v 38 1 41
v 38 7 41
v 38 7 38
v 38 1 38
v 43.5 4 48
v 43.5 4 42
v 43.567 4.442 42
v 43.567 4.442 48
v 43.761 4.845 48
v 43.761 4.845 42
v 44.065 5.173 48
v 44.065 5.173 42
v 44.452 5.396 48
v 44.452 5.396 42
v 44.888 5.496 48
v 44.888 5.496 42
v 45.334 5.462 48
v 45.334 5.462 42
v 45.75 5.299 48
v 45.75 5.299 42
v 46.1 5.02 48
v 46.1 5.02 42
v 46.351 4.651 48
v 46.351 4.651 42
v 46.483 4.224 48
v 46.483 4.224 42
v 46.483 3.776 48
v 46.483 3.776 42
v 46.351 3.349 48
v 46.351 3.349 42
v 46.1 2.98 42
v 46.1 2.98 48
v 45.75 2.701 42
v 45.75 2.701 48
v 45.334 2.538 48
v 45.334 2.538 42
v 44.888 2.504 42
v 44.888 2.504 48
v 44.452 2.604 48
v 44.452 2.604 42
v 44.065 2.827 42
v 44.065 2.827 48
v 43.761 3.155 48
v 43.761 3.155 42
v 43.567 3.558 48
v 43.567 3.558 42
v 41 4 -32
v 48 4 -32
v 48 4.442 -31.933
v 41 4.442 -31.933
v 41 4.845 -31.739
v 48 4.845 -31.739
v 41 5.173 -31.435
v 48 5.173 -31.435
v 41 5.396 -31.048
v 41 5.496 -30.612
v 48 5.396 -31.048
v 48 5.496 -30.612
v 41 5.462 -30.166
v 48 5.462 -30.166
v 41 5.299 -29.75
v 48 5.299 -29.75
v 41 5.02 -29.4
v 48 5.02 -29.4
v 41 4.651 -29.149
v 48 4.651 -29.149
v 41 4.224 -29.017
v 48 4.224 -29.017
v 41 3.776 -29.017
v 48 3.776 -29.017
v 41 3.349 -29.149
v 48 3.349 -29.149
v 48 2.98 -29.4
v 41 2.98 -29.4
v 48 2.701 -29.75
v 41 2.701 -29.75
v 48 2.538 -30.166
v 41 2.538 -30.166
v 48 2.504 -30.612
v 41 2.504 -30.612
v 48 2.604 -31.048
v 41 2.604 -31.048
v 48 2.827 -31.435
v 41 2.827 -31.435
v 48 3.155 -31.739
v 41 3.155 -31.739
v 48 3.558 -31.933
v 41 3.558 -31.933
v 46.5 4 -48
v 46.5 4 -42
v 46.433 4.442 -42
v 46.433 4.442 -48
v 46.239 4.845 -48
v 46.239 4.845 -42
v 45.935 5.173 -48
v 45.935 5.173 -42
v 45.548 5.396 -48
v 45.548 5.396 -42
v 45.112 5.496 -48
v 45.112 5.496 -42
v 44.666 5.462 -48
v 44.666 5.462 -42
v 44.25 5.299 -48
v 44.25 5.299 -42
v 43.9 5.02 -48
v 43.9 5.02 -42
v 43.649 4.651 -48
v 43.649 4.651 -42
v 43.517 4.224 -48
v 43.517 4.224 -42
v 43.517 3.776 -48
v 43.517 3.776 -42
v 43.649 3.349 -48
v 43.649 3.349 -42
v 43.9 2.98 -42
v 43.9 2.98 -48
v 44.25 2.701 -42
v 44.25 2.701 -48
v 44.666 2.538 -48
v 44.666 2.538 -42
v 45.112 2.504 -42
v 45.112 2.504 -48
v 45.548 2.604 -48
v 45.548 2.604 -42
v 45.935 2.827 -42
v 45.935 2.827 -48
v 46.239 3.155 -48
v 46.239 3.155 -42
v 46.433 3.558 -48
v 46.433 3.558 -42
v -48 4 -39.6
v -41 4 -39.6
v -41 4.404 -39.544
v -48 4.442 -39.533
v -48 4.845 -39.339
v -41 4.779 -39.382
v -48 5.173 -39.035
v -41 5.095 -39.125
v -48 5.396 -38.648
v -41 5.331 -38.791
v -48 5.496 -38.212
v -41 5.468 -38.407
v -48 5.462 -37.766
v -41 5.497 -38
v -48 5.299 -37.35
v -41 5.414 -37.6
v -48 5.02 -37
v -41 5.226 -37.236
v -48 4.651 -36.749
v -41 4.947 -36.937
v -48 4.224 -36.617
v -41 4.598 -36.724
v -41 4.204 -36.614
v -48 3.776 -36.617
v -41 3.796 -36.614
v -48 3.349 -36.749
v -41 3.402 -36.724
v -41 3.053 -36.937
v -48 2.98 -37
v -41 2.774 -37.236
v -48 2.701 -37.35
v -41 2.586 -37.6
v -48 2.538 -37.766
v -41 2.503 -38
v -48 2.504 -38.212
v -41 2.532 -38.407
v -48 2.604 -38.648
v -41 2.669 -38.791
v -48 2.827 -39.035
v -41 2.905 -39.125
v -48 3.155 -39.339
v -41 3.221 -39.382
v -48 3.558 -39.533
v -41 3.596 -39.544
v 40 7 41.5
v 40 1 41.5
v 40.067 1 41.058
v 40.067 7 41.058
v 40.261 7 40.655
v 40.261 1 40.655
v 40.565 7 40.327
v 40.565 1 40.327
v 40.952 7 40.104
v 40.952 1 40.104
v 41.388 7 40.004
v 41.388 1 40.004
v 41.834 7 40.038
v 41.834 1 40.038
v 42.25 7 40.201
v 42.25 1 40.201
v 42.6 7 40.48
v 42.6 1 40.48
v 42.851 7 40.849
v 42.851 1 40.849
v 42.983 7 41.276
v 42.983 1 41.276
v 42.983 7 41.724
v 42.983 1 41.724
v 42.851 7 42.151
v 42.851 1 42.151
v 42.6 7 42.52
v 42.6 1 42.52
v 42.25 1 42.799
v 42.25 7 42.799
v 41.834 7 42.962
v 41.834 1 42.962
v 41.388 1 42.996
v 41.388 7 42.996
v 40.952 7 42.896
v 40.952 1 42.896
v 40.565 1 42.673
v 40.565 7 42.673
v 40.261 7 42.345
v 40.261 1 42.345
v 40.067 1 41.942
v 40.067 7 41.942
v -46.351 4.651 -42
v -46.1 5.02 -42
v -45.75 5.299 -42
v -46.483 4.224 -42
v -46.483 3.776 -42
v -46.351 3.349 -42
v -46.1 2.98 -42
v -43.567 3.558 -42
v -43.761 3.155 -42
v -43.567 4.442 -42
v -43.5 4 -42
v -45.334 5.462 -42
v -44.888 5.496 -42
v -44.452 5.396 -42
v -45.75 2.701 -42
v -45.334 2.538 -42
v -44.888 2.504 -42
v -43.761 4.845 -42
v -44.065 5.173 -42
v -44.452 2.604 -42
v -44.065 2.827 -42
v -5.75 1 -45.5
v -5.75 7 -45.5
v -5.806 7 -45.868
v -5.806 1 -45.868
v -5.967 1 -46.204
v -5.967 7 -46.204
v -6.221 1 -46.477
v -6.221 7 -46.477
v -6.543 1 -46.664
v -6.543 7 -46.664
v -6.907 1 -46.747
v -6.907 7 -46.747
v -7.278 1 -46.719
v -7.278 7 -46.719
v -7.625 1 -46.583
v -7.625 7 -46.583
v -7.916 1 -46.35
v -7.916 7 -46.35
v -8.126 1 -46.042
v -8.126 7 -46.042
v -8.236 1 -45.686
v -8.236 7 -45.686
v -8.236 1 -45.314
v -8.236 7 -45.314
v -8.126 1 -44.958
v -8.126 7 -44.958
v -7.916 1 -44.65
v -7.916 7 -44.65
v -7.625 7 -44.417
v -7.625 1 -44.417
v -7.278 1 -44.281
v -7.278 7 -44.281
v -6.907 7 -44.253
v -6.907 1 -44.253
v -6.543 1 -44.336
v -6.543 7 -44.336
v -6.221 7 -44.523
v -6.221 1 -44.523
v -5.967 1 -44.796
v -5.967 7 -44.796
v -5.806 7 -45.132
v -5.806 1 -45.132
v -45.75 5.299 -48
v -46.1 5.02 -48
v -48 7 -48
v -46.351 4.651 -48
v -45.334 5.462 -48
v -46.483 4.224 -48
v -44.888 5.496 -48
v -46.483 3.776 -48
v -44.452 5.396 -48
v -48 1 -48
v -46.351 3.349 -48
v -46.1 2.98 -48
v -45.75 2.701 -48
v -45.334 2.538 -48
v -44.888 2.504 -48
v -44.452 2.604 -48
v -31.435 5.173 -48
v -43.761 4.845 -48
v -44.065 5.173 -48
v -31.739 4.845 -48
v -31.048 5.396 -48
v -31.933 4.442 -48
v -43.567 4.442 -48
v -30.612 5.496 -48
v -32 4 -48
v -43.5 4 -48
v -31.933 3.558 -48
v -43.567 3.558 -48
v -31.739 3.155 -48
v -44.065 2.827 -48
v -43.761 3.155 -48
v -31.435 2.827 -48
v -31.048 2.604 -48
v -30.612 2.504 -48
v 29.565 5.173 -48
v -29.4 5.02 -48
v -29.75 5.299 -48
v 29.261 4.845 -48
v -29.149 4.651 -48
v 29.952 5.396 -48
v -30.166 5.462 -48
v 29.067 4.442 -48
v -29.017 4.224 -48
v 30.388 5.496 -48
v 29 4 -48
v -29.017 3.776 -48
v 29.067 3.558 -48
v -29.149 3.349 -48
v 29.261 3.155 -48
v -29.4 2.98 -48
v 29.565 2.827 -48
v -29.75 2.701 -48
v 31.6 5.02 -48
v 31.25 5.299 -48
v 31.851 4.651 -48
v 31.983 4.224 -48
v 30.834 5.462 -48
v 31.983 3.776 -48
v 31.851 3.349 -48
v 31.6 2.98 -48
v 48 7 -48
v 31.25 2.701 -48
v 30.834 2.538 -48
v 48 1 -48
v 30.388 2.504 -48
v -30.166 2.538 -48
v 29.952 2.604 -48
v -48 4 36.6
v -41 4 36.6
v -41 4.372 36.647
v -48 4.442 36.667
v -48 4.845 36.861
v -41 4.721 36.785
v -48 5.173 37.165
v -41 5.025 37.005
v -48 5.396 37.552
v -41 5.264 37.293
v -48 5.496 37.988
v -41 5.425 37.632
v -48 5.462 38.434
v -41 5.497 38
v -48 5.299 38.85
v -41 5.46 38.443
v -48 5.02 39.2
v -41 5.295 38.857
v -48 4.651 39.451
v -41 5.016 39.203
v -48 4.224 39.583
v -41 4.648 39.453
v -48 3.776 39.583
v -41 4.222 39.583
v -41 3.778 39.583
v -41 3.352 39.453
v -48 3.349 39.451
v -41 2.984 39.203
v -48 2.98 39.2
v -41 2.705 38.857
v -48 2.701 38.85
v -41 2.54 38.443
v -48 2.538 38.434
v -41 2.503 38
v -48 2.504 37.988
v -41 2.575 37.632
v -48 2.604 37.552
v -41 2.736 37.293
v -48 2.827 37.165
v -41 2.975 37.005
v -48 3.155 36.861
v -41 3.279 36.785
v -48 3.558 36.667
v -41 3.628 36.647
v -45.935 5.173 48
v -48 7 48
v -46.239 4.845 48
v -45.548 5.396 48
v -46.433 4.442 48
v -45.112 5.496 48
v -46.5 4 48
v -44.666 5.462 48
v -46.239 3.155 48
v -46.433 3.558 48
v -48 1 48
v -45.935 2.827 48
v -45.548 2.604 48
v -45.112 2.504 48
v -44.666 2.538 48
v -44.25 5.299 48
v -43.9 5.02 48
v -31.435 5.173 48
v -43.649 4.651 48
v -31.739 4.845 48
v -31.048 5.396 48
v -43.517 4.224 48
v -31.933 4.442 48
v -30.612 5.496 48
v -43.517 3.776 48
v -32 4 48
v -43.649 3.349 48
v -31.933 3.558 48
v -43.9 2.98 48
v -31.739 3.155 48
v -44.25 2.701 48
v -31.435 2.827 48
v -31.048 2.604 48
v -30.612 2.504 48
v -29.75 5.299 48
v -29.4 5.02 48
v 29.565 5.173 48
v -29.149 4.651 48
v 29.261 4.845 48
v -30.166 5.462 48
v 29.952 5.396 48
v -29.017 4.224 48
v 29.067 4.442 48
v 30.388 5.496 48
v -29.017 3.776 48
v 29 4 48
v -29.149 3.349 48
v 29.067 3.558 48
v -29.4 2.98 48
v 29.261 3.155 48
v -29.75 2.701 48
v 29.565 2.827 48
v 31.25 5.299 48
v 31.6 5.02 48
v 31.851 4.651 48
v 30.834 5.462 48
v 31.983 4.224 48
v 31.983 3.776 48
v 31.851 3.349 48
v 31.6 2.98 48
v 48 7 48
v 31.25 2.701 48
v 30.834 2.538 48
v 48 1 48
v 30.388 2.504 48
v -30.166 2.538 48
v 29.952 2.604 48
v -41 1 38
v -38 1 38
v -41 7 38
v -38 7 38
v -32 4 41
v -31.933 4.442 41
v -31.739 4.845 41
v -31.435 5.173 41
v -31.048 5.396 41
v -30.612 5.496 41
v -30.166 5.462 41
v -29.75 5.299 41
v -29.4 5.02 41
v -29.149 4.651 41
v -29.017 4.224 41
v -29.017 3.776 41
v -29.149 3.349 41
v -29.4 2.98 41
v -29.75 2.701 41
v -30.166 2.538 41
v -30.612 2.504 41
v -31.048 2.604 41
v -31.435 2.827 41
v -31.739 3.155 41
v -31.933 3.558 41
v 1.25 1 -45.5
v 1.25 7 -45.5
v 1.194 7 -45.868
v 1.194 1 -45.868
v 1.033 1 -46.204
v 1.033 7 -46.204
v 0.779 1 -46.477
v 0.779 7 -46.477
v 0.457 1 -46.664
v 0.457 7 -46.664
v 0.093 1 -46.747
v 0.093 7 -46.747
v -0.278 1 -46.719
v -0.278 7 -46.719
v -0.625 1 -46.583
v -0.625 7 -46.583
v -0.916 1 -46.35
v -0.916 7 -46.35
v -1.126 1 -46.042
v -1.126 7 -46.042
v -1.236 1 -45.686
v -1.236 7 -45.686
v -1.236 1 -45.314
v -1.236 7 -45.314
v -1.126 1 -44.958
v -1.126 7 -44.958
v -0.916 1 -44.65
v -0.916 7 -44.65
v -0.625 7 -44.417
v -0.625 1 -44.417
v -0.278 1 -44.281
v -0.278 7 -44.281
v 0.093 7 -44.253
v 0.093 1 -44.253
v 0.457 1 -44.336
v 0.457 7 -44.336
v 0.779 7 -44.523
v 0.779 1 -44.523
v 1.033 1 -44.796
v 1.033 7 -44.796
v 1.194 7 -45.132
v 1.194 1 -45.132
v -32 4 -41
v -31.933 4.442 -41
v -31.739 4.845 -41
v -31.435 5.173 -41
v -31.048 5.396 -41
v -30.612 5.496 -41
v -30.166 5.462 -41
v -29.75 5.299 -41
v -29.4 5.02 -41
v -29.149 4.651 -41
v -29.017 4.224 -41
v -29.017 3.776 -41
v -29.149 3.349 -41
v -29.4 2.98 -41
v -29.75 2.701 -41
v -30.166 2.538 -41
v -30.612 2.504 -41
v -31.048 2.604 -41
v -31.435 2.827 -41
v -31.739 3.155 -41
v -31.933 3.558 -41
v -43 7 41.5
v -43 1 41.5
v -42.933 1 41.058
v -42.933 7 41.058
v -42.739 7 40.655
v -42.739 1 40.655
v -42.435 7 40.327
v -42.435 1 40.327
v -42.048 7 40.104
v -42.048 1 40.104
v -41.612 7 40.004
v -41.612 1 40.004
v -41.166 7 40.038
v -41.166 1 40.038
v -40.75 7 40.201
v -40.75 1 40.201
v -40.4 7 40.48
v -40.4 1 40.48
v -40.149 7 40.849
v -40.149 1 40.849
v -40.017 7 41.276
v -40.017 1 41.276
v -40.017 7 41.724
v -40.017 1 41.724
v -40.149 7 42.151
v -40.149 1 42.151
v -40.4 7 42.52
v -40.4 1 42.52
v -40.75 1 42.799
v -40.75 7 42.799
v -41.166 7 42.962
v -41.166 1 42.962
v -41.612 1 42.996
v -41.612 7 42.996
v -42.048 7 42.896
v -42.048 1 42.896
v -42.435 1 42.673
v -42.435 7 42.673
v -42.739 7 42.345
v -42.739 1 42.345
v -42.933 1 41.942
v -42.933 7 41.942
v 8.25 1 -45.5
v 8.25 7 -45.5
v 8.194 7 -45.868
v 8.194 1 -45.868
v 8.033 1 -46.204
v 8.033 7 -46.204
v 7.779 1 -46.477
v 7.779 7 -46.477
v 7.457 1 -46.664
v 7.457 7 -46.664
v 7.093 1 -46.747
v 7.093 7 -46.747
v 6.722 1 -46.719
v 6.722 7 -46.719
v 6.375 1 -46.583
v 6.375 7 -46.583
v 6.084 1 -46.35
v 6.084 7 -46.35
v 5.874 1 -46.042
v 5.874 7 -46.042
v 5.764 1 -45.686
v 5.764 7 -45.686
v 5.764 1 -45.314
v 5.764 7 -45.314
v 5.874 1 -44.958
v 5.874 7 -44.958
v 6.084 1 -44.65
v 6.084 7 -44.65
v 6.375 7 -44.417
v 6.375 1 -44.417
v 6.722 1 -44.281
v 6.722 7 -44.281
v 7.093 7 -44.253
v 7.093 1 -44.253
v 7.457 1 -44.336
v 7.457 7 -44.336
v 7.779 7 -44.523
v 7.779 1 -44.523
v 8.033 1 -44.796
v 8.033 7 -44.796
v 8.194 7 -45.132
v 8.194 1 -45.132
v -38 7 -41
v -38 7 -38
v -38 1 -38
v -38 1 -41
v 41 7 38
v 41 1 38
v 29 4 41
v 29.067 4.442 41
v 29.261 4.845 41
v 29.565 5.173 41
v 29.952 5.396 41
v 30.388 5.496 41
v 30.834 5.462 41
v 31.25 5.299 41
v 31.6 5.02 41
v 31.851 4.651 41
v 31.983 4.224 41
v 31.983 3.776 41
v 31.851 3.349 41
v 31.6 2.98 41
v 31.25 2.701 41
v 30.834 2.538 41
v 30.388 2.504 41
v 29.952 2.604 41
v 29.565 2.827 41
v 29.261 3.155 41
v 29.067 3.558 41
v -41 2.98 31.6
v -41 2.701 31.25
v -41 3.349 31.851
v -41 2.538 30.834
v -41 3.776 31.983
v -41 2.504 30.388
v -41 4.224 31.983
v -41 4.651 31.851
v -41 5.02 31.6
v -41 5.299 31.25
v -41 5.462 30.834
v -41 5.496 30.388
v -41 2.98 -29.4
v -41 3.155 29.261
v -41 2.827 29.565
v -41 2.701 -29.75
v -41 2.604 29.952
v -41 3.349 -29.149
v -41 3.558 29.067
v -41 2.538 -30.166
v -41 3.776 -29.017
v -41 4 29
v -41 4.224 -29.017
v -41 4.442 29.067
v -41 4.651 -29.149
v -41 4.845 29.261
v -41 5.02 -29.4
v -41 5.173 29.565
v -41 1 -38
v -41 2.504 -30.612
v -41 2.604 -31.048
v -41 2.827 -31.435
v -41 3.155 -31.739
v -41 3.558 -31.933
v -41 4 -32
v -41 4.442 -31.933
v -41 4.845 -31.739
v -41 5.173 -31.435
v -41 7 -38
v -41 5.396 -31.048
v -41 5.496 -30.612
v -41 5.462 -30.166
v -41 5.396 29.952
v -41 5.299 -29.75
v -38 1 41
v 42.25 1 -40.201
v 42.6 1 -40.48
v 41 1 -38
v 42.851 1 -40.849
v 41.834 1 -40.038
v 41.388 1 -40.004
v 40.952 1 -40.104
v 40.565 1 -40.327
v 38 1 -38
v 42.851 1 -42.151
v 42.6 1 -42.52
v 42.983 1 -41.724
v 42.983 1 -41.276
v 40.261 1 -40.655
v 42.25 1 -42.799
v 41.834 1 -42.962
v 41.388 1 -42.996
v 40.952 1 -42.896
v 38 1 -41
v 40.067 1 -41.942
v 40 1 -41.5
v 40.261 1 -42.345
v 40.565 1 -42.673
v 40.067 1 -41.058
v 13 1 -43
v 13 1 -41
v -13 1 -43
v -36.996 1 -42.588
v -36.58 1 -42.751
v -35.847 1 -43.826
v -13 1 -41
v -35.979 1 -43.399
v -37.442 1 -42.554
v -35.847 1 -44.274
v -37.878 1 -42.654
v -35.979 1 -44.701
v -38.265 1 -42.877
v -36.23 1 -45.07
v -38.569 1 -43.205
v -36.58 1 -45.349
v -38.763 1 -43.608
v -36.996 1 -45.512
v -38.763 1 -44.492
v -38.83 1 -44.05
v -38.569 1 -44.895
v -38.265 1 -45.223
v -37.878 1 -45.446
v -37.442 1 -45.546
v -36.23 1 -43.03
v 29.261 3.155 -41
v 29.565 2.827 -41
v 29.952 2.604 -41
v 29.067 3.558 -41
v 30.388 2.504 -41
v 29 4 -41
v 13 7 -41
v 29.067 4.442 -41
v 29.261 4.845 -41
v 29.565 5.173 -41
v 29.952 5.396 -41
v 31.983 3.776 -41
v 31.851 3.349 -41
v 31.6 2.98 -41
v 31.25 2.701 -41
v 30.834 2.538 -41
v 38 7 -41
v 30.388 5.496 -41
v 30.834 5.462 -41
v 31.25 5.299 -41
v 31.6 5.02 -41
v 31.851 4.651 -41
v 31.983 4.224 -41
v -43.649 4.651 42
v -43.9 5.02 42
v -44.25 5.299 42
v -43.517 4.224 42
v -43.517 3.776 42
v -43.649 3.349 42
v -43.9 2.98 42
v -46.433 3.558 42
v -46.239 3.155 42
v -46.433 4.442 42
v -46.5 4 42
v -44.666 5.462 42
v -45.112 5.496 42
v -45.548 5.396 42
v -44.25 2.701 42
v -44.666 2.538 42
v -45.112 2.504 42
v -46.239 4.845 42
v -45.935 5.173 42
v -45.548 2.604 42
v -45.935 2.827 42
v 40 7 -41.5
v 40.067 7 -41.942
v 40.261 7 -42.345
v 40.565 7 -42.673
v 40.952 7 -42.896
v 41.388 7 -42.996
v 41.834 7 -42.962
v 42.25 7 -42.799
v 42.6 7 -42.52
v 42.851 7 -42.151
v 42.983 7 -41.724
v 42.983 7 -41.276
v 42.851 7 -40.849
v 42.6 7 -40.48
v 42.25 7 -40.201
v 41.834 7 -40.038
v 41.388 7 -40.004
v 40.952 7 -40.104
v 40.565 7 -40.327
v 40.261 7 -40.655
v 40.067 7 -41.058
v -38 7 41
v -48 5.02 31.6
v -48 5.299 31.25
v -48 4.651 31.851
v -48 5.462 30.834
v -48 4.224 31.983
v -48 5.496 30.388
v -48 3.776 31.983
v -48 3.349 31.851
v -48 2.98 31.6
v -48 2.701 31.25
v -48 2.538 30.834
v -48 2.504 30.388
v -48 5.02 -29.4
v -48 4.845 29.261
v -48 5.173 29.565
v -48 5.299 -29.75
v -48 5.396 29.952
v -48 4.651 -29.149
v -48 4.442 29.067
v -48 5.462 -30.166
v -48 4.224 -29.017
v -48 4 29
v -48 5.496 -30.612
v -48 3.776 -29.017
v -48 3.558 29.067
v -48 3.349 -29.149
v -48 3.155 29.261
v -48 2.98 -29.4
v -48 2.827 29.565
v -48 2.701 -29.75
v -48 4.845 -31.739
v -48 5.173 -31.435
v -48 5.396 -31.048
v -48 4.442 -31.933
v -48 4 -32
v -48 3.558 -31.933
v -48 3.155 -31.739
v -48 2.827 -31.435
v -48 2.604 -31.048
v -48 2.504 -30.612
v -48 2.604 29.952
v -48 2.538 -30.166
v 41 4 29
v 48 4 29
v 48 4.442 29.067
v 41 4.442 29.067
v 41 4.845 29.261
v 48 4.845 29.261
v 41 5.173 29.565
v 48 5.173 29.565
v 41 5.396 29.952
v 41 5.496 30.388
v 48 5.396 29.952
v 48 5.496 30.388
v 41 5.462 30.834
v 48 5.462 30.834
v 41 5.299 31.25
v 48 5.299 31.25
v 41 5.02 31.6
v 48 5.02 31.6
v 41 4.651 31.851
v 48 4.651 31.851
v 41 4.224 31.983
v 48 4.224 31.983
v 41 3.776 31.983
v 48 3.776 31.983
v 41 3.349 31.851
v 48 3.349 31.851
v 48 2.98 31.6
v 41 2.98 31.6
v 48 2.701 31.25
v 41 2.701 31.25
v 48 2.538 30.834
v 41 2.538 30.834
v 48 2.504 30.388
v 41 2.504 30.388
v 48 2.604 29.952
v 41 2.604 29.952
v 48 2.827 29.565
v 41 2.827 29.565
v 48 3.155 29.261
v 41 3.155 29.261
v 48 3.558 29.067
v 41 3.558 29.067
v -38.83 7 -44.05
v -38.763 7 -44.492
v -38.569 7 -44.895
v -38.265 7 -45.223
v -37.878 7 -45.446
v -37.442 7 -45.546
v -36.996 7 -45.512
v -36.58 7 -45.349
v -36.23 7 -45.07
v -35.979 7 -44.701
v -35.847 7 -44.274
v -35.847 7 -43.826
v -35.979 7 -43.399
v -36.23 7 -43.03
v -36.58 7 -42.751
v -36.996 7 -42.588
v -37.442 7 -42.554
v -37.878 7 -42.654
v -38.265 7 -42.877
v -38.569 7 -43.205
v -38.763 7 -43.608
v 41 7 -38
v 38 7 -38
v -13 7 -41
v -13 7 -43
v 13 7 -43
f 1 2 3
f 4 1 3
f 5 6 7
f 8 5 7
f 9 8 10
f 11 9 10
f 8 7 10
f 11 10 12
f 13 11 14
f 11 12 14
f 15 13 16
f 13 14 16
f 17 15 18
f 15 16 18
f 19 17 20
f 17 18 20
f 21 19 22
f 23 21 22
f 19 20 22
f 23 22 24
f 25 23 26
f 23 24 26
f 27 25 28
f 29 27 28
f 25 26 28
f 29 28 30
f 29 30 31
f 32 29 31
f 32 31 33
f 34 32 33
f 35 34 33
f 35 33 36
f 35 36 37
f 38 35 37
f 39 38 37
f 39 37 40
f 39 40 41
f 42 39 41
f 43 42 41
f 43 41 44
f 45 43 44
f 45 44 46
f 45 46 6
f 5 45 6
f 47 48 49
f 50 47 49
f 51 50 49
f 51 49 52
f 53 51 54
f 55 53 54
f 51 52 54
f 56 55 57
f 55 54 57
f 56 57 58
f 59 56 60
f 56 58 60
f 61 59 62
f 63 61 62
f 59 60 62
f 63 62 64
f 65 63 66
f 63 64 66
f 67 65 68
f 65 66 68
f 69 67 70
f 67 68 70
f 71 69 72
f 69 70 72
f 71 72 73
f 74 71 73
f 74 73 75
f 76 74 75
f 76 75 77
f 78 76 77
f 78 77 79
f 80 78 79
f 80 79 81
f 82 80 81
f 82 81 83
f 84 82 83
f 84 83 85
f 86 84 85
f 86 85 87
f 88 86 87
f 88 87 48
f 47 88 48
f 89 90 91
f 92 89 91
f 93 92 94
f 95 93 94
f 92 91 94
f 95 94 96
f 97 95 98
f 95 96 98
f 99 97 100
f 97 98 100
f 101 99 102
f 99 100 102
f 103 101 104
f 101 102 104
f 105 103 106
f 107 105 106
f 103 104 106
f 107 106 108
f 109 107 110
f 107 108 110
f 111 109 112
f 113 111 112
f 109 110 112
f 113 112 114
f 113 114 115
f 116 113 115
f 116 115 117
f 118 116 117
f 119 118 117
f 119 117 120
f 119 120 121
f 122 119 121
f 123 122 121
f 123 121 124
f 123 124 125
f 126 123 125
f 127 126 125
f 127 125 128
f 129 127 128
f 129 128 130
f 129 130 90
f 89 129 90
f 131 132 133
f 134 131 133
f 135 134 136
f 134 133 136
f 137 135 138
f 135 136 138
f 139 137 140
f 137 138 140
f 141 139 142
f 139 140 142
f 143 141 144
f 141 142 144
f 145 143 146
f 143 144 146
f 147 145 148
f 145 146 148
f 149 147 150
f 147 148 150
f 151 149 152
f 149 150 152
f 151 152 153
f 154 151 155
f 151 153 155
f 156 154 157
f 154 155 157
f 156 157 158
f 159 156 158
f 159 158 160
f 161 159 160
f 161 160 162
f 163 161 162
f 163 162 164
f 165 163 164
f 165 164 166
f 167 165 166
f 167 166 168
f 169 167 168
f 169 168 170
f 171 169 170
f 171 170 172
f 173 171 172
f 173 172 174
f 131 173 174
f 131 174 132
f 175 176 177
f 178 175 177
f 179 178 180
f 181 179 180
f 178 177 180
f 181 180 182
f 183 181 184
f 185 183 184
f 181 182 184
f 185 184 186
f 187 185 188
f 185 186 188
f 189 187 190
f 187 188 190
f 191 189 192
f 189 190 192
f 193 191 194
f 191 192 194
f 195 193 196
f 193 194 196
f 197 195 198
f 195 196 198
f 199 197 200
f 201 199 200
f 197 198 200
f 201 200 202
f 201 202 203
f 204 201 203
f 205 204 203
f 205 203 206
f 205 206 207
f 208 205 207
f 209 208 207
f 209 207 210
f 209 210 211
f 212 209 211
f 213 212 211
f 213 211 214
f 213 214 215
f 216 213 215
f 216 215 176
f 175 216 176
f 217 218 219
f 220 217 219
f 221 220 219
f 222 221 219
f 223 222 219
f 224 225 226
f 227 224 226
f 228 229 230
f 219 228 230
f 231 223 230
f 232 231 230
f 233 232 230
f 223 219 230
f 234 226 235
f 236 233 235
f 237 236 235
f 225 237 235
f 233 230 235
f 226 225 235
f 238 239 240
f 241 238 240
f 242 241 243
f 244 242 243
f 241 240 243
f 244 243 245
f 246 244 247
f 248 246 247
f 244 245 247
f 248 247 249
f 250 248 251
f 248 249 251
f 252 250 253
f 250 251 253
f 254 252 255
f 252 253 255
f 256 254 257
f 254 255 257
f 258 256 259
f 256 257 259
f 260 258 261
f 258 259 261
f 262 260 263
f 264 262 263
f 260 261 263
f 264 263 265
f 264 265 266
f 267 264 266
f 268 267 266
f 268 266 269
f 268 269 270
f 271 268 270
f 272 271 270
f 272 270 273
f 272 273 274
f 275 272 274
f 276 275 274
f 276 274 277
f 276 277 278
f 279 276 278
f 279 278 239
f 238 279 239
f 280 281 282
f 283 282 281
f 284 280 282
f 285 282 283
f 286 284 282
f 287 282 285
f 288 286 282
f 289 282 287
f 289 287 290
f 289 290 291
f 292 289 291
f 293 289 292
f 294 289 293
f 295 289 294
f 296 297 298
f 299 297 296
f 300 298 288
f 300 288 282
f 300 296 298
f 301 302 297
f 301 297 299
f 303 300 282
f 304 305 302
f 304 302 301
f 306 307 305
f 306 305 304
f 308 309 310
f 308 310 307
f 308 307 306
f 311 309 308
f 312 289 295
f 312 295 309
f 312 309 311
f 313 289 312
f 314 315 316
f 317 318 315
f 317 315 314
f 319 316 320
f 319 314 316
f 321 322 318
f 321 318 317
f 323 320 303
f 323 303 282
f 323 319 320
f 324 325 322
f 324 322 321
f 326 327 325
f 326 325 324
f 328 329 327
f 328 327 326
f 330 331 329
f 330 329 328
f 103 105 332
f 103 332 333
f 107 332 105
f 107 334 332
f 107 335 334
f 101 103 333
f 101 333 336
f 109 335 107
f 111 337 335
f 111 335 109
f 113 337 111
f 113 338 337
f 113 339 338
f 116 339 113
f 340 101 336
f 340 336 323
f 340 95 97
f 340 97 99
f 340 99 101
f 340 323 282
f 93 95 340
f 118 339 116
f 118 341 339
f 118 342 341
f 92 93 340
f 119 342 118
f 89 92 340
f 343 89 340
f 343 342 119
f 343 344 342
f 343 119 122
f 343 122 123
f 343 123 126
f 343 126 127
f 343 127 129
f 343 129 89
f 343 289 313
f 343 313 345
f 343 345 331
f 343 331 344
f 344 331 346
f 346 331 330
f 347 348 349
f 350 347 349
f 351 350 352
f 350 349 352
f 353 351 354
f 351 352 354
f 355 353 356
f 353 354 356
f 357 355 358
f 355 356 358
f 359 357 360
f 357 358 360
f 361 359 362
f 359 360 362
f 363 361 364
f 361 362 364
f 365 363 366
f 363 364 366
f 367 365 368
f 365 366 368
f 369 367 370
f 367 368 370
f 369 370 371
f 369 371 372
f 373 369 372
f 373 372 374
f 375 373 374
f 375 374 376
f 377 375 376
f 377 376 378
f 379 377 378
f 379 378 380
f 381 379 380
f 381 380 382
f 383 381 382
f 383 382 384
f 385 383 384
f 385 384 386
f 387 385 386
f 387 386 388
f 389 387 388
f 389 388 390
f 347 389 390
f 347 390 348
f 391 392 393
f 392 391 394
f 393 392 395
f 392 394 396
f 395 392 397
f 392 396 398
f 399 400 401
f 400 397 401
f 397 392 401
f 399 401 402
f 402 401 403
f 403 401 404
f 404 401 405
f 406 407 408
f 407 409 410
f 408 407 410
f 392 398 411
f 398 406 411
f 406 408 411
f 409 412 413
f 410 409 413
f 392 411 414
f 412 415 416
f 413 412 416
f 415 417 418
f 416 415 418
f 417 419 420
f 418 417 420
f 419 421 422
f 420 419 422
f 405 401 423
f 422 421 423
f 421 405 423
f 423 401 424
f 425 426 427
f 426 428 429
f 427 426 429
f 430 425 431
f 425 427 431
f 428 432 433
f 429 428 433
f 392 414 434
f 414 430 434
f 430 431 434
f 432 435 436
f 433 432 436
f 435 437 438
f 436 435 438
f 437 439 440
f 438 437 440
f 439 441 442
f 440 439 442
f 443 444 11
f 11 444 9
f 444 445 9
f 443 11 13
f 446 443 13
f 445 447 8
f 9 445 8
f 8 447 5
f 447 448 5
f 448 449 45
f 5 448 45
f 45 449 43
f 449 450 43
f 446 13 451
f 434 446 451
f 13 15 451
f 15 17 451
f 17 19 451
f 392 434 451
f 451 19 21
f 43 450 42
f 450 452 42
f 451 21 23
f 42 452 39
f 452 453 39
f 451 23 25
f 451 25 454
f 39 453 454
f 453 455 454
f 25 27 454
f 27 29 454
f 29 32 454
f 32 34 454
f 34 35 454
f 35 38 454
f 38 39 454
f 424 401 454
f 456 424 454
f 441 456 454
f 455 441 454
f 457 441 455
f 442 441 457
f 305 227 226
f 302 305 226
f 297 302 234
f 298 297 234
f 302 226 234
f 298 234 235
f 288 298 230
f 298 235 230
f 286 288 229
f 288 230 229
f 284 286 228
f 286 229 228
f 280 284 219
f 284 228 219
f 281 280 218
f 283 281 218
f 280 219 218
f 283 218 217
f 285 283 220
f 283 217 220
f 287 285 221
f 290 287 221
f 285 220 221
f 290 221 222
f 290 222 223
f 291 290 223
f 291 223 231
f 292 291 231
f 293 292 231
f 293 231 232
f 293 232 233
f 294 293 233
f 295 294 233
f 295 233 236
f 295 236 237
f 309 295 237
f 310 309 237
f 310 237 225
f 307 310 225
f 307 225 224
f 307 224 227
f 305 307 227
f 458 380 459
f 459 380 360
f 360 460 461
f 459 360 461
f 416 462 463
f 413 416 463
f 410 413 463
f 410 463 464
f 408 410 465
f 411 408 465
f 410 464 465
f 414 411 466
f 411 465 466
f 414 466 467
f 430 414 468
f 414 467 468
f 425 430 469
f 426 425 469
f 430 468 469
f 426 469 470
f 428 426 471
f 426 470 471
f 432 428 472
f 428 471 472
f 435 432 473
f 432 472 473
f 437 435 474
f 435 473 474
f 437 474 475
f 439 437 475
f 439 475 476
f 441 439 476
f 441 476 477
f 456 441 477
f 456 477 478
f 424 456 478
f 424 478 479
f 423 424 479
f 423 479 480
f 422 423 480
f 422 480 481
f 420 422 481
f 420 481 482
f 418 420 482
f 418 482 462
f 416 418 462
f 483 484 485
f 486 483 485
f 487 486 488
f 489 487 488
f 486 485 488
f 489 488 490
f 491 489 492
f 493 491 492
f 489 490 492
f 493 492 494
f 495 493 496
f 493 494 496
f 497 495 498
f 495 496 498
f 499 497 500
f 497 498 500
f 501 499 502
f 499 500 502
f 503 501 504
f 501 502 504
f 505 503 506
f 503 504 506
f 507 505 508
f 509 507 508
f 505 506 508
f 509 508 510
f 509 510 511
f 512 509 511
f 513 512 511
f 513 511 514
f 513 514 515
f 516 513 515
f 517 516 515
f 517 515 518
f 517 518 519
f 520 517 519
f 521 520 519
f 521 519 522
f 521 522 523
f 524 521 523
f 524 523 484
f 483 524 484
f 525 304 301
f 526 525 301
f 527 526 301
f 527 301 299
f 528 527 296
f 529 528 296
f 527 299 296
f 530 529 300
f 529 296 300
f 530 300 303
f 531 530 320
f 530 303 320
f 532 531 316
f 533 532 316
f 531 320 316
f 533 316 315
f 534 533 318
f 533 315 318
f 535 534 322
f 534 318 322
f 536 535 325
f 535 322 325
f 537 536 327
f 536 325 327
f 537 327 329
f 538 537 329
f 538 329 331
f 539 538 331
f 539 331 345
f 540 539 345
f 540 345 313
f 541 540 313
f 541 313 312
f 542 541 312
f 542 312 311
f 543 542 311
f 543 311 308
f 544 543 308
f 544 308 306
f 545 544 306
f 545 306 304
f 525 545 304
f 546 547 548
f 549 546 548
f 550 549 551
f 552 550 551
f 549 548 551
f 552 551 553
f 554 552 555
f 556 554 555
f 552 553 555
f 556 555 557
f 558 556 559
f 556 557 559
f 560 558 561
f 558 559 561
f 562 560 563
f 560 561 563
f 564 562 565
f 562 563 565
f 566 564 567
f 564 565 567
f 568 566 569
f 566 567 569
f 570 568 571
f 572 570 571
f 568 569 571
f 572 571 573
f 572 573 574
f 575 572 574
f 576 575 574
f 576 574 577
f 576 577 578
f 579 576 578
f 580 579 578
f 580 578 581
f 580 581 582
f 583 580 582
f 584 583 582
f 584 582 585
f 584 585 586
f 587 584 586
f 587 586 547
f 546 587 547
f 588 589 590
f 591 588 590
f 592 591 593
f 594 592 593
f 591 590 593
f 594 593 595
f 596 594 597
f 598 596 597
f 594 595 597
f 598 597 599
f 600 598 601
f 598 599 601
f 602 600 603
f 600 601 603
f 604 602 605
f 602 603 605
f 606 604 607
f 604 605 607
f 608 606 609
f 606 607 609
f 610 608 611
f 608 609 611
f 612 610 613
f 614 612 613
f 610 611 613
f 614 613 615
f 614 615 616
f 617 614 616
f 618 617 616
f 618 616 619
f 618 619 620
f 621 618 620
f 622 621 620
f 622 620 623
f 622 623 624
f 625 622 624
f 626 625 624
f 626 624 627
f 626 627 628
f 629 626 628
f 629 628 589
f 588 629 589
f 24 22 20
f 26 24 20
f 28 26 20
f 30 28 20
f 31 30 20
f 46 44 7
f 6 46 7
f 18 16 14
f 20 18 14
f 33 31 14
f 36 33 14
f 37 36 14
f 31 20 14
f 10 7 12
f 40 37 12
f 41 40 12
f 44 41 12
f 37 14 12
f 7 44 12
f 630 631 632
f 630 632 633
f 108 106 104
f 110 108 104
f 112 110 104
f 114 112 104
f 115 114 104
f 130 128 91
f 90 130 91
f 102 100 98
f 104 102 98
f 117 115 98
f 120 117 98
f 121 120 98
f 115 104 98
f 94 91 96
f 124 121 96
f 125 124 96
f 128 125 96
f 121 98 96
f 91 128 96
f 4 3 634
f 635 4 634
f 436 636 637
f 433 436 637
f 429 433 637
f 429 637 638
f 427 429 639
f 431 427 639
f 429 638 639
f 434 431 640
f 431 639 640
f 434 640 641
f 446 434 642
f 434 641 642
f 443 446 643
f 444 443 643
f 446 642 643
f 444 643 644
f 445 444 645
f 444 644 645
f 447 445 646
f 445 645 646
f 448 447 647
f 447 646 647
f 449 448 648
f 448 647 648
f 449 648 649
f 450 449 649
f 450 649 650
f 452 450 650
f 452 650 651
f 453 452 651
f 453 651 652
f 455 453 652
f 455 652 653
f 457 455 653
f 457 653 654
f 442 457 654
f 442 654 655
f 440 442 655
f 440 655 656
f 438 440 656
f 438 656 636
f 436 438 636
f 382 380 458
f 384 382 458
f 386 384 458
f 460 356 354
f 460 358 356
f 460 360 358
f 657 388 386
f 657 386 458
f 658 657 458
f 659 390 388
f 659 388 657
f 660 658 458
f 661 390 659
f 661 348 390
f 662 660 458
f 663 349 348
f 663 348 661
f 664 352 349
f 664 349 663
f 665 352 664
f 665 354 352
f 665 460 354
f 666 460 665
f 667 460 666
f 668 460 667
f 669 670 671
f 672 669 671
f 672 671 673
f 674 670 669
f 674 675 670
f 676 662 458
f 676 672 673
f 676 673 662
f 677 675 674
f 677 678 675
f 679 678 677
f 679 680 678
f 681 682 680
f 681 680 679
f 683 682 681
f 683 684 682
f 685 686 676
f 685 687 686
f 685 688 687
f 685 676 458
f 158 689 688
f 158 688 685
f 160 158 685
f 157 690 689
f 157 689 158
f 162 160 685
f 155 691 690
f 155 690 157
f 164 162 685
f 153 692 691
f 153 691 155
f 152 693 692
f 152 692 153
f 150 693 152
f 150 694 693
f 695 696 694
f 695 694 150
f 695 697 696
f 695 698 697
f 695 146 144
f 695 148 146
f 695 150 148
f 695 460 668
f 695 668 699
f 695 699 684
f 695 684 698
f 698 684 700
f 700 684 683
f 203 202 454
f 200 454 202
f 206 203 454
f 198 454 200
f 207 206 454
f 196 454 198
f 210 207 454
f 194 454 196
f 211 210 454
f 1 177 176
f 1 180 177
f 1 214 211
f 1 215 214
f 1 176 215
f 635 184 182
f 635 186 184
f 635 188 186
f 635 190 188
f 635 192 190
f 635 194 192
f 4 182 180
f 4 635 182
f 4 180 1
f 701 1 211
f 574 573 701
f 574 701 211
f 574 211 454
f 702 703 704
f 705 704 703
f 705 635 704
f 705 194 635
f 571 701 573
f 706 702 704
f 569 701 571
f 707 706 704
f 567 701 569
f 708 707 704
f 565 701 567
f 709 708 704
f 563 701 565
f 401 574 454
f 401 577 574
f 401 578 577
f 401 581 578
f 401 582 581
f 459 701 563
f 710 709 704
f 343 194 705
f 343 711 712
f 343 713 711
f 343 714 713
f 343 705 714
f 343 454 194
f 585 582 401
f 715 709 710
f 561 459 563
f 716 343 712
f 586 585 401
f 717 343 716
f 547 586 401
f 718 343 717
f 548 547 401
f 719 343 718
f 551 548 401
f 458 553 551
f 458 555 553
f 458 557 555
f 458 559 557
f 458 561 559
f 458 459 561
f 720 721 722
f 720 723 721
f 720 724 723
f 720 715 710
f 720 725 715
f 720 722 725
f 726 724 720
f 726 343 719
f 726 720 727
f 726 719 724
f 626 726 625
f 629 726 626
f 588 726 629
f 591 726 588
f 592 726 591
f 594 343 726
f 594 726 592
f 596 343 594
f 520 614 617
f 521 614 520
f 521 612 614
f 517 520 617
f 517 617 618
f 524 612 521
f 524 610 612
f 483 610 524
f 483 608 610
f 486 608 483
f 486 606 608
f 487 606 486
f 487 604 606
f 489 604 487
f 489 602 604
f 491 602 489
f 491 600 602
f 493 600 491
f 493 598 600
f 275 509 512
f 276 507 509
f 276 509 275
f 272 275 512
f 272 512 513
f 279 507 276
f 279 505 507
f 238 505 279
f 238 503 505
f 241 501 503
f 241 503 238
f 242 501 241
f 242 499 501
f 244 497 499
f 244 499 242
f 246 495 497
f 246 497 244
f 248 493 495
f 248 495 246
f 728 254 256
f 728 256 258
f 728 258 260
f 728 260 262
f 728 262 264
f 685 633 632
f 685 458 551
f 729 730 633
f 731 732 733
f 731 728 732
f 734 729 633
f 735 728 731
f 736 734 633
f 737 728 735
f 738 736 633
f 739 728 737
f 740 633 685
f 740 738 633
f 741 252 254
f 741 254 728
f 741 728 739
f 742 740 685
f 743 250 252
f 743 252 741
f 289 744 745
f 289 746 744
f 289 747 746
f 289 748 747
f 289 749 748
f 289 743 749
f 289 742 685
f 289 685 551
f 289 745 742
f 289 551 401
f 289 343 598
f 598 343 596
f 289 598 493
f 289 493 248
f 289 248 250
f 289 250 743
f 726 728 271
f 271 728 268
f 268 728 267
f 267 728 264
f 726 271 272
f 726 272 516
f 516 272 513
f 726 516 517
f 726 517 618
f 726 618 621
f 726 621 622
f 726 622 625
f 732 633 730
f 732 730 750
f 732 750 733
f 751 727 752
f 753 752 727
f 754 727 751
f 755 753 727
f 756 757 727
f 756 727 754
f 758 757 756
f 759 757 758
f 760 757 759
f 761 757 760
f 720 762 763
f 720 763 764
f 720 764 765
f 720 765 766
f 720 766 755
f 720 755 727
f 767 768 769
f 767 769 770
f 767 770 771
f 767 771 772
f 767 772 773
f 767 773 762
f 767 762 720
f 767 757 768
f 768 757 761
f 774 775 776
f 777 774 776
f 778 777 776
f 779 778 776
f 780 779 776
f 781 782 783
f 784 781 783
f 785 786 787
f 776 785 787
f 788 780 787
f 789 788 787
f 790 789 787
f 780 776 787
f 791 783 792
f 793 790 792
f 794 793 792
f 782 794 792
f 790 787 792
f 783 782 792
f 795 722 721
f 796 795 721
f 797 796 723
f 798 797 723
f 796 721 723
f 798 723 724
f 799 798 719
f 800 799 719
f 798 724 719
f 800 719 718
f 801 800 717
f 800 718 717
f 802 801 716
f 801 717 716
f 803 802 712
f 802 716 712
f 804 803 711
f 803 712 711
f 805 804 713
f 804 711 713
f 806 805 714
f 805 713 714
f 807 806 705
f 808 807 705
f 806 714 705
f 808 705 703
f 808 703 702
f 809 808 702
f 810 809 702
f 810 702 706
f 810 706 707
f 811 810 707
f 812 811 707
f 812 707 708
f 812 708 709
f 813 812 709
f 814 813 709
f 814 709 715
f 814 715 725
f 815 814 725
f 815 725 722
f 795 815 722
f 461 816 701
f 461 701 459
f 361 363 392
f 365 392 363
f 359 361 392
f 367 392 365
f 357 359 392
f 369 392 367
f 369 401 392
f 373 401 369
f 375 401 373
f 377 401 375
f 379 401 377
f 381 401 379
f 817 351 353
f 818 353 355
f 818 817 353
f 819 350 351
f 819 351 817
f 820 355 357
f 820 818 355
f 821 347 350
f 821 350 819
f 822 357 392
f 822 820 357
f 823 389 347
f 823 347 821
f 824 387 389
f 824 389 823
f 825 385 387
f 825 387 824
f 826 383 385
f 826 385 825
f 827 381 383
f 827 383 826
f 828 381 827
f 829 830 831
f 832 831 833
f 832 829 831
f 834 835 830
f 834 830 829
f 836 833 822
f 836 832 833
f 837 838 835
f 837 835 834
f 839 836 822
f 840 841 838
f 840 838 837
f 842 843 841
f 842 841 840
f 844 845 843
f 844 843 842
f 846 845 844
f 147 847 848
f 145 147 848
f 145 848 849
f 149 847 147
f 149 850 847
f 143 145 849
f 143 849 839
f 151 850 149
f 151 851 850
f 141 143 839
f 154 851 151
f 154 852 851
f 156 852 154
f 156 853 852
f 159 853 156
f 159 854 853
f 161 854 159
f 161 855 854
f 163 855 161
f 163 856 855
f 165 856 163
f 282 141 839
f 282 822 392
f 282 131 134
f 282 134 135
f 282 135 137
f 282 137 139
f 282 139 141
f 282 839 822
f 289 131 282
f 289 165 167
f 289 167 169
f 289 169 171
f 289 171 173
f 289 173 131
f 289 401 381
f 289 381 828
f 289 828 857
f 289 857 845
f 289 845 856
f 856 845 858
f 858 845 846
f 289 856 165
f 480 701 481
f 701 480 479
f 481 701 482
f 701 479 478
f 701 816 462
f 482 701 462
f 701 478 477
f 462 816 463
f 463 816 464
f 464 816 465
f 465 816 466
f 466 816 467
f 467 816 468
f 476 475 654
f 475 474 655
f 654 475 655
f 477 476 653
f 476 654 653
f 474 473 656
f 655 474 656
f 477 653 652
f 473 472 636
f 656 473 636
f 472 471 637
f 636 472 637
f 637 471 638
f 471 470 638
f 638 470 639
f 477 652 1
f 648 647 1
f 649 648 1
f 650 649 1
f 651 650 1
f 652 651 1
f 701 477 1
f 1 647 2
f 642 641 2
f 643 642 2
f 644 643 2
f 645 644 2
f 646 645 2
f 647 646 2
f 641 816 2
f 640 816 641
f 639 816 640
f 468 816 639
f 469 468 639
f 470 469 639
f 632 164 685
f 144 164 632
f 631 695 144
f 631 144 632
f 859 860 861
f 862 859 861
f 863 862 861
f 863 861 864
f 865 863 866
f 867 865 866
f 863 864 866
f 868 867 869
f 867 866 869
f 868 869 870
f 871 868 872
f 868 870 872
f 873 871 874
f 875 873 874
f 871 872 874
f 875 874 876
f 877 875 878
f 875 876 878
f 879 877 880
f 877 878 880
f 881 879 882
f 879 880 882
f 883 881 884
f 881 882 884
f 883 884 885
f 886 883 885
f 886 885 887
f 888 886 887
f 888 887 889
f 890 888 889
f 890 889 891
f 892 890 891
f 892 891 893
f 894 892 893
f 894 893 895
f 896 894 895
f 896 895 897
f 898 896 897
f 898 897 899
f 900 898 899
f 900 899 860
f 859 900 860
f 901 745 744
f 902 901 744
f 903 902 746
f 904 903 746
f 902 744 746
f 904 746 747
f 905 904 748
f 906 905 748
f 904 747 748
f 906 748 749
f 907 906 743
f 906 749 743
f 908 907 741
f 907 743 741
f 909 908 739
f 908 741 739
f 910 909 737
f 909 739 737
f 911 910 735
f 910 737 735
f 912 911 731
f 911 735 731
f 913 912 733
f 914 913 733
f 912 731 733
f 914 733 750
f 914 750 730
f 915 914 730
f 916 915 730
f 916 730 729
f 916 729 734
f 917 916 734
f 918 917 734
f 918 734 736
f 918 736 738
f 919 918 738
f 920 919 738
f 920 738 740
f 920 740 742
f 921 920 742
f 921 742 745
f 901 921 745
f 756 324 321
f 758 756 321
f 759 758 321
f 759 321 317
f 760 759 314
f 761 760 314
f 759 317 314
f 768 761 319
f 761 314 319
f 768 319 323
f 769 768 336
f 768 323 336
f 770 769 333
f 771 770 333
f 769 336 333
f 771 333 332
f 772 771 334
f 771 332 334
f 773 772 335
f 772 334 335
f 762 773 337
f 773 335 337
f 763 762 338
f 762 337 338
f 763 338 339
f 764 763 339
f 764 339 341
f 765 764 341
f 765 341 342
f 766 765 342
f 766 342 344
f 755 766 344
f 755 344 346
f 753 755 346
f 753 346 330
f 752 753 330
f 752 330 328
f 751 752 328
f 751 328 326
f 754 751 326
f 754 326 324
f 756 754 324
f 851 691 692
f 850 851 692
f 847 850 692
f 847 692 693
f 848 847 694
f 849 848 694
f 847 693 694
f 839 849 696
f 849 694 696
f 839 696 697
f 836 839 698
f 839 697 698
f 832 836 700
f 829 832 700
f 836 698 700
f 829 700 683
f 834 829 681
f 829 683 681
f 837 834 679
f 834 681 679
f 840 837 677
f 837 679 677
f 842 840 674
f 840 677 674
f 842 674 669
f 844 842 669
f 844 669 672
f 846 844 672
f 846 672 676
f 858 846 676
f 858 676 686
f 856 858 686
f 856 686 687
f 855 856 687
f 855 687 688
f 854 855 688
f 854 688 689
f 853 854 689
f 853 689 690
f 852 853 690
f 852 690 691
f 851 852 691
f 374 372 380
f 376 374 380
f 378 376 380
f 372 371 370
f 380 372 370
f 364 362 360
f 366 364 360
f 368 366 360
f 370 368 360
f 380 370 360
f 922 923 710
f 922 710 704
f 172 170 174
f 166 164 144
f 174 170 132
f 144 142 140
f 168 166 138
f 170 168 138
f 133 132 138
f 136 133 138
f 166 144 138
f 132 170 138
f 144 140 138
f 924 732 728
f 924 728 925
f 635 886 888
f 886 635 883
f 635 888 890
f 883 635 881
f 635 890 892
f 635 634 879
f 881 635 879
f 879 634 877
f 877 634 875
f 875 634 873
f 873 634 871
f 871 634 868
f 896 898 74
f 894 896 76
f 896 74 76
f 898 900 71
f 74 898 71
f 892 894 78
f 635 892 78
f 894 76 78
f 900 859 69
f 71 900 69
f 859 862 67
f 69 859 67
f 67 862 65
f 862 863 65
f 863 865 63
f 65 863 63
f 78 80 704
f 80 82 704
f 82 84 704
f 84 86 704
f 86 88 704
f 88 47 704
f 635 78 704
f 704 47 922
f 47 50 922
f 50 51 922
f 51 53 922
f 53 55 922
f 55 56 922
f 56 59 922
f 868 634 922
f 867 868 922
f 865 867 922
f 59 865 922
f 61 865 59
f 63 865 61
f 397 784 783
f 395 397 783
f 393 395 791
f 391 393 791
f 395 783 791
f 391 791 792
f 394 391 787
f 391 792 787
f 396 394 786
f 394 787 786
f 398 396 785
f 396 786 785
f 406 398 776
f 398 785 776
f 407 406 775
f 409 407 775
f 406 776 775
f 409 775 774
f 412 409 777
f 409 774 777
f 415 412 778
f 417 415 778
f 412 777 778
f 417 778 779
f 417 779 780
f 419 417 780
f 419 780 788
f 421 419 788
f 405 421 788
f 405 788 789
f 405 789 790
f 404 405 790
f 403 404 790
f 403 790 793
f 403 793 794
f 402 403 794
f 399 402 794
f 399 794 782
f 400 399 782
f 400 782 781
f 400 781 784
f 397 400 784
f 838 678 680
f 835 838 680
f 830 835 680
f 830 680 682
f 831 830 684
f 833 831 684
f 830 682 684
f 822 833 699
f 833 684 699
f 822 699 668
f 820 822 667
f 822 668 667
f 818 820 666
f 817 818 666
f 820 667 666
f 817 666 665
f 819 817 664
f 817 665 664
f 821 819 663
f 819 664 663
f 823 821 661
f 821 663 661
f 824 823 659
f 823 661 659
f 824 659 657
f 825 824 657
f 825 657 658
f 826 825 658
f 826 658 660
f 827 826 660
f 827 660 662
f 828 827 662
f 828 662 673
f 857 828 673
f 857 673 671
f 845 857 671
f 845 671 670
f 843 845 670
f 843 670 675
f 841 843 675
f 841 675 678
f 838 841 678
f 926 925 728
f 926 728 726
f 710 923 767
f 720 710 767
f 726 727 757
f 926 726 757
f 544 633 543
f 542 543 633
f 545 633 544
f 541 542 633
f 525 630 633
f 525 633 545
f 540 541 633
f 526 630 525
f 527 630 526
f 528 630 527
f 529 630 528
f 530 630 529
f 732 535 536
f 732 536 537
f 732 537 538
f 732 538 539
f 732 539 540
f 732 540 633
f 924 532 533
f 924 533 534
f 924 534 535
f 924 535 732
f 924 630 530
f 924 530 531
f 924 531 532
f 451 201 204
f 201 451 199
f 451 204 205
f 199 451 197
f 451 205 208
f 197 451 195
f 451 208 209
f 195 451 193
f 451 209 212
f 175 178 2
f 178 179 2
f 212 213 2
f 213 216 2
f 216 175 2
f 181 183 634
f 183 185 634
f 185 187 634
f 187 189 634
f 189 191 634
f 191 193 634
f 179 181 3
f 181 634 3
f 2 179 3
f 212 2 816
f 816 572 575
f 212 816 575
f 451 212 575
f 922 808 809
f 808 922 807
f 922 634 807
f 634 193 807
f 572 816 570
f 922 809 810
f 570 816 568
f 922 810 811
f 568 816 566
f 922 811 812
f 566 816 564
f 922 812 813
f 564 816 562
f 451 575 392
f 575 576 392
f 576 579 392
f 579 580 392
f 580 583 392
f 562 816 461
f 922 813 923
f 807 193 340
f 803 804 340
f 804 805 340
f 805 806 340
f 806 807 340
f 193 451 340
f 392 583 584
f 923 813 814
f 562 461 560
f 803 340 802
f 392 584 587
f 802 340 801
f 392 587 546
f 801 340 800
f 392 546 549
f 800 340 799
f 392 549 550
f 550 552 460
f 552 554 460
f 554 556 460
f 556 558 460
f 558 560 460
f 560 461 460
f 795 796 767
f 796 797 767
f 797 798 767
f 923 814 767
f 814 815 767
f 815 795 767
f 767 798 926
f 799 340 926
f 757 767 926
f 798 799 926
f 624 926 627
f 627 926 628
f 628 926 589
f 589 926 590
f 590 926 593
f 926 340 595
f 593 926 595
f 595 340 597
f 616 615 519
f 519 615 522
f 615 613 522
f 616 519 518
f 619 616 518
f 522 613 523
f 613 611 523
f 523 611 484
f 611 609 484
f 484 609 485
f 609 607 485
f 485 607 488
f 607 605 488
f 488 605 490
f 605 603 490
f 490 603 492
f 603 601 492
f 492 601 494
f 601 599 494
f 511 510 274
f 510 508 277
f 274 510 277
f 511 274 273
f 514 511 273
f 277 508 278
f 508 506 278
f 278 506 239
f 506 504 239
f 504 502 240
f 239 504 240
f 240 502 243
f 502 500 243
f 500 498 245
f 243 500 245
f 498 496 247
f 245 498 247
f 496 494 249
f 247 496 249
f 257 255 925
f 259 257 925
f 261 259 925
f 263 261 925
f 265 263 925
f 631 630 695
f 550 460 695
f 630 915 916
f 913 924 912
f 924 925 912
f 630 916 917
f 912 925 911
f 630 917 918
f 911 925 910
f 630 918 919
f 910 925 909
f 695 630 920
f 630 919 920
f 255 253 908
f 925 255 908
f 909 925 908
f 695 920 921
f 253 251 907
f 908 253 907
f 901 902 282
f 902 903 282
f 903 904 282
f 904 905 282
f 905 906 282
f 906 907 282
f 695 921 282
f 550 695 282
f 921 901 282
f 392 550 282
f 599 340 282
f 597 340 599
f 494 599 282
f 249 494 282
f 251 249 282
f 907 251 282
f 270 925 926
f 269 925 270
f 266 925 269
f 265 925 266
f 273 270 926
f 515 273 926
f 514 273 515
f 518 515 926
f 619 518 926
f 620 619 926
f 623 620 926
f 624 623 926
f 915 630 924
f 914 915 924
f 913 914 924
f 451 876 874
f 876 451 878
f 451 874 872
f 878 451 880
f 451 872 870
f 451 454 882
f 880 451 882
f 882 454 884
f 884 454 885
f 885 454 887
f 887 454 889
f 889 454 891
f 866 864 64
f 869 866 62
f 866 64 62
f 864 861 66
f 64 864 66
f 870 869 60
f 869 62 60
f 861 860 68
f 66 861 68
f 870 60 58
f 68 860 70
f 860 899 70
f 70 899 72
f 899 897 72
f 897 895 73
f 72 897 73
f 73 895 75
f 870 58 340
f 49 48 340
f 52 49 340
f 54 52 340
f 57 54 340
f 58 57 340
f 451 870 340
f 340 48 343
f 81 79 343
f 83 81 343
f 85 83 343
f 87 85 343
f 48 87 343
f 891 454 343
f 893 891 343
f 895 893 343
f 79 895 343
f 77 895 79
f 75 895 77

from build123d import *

# Parameters (mm, degrees)
SKETCH1_W                       = 96
SKETCH1_H                       = 96
SKETCH1_W_2                     = 80
SKETCH1_H_2                     = 80
BOSS_EXTRUDE1_DEPTH             = 8
F_3_0_3_DIAMETER_HOLE6_D        = 3
F_3_0_3_DIAMETER_HOLE6_DEPTH    = 6
F_3_0_3_DIAMETER_HOLE3_D        = 3
F_3_0_3_DIAMETER_HOLE3_DEPTH    = 6
SKETCH27_W                      = 82
SKETCH27_H                      = 82
CUT_EXTRUDE2_DEPTH              = 10
F_3_0_3_DIAMETER_HOLE1_D        = 3
F_3_0_3_DIAMETER_HOLE2_D        = 3
SKETCH35_W                      = 3
SKETCH35_H                      = 3
BOSS_EXTRUDE2_DEPTH             = 8
F_3_0_3_DIAMETER_HOLE7_D        = 3
SKETCH44_W                      = 96
SKETCH44_H                      = 1
CUT_EXTRUDE4_DEPTH              = 142
SKETCH47_W                      = 14
SKETCH47_H                      = 2
CUT_EXTRUDE5_DEPTH              = 10
F_2_5_2_5_DIAMETER_HOLE1_D      = 2.5
TAP_DRILL_FOR_M3X0_5_TAP3_D     = 3
TAP_DRILL_FOR_M3X0_5_TAP3_DEPTH = 7
SKETCH54_W                      = 6
SKETCH54_H                      = 6
CUT_EXTRUDE6_DEPTH              = 2


with BuildPart() as part:
    # Sketch1 → Boss-Extrude1 (new body)
    with BuildSketch(Plane(origin=(0, 0, 0), x_dir=(1, 0, 0), z_dir=(0, 1, 0))):
        Rectangle(SKETCH1_W, SKETCH1_H)
        Rectangle(SKETCH1_W_2, SKETCH1_H_2, mode=Mode.SUBTRACT)
    extrude(amount=BOSS_EXTRUDE1_DEPTH)

    # Ø3.0 (3) Diameter Hole6
    with Locations(Plane.XY.offset(48)):
        with Locations((45, 4), (-45, 4)):
            Hole(F_3_0_3_DIAMETER_HOLE6_D / 2, depth=F_3_0_3_DIAMETER_HOLE6_DEPTH)

    # Ø3.0 (3) Diameter Hole3
    with Locations(Plane(origin=(0, 0, -48), x_dir=(-1, 0, 0), z_dir=(0, 0, -1))):
        with Locations((-45, 4), (45, 4)):
            Hole(F_3_0_3_DIAMETER_HOLE3_D / 2, depth=F_3_0_3_DIAMETER_HOLE3_DEPTH)

    # Sketch27 → Cut-Extrude2 (cut)
    with BuildSketch(Plane(origin=(0, 8, 0), x_dir=(1, 0, 0), z_dir=(0, 1, 0))):
        Rectangle(SKETCH27_W, SKETCH27_H)
    extrude(amount=-CUT_EXTRUDE2_DEPTH, mode=Mode.SUBTRACT)

    # Ø3.0 (3) Diameter Hole1 (through all)
    with Locations(Plane.XY.offset(48)):
        with Locations((-30.5, 4), (30.5, 4)):
            Hole(F_3_0_3_DIAMETER_HOLE1_D / 2)

    # Ø3.0 (3) Diameter Hole2 (through all)
    with Locations(Plane.ZY.offset(48)):
        with Locations((-30.5, 4), (30.5, 4)):
            Hole(F_3_0_3_DIAMETER_HOLE2_D / 2)

    # Sketch35 → Boss-Extrude2 (add)
    with BuildSketch(Plane(origin=(0, 8, 0), x_dir=(1, 0, 0), z_dir=(0, 1, 0))):
        with Locations((39.5, -39.5)):
            Rectangle(SKETCH35_W, SKETCH35_H)
        with Locations((-39.5, 39.5)):
            Rectangle(SKETCH35_W, SKETCH35_H)
        with Locations((39.5, 39.5)):
            Rectangle(SKETCH35_W, SKETCH35_H)
        with Locations((-39.5, -39.5)):
            Rectangle(SKETCH35_W, SKETCH35_H)
    extrude(amount=-BOSS_EXTRUDE2_DEPTH)

    # Ø3.0 (3) Diameter Hole7 (through all)
    with Locations(Plane(origin=(0, 8, 0), x_dir=(1, 0, 0), z_dir=(0, 1, 0))):
        with Locations((-37.33, 44.05), (41.5, 41.5), (41.5, -41.5), (-41.5, -41.5)):
            Hole(F_3_0_3_DIAMETER_HOLE7_D / 2)

    # Sketch44 → Cut-Extrude4 (cut)
    with BuildSketch(Plane(origin=(0, 0, -48), x_dir=(-1, 0, 0), z_dir=(0, 0, -1))):
        with Locations((0, 7.5)):
            Rectangle(SKETCH44_W, SKETCH44_H)
        with Locations((0, 0.5)):
            Rectangle(SKETCH44_W, SKETCH44_H)
    extrude(amount=-CUT_EXTRUDE4_DEPTH, mode=Mode.SUBTRACT)

    # Sketch47 → Cut-Extrude5 (cut)
    with BuildSketch(Plane(origin=(0, 7, 0), x_dir=(1, 0, 0), z_dir=(0, 1, 0))):
        with Locations((0, 42)):
            Rectangle(SKETCH47_W, SKETCH47_H)
    extrude(amount=-CUT_EXTRUDE5_DEPTH, mode=Mode.SUBTRACT)

    # Ø2.5 (2.5) Diameter Hole1 (through all)
    with Locations(Plane(origin=(0, 1, 0), x_dir=(-1, 0, 0), z_dir=(0, -1, 0))):
        with Locations((7, 45.5), (0, 45.5), (-7, 45.5)):
            Hole(F_2_5_2_5_DIAMETER_HOLE1_D / 2)

    # Tap Drill for M3x0.5 Tap3
    with Locations(Plane.ZY.offset(48)):
        with Locations((38.1, 4), (-38.1, 4)):
            Hole(TAP_DRILL_FOR_M3X0_5_TAP3_D / 2, depth=TAP_DRILL_FOR_M3X0_5_TAP3_DEPTH)

    # Sketch54 → Cut-Extrude6 (cut)
    with BuildSketch(Plane.XY.offset(-41)):
        with Locations((-10, 4)):
            Rectangle(SKETCH54_W, SKETCH54_H)
        with Locations((10, 4)):
            Rectangle(SKETCH54_W, SKETCH54_H)
    extrude(amount=-CUT_EXTRUDE6_DEPTH, mode=Mode.SUBTRACT)


solid = part.part
